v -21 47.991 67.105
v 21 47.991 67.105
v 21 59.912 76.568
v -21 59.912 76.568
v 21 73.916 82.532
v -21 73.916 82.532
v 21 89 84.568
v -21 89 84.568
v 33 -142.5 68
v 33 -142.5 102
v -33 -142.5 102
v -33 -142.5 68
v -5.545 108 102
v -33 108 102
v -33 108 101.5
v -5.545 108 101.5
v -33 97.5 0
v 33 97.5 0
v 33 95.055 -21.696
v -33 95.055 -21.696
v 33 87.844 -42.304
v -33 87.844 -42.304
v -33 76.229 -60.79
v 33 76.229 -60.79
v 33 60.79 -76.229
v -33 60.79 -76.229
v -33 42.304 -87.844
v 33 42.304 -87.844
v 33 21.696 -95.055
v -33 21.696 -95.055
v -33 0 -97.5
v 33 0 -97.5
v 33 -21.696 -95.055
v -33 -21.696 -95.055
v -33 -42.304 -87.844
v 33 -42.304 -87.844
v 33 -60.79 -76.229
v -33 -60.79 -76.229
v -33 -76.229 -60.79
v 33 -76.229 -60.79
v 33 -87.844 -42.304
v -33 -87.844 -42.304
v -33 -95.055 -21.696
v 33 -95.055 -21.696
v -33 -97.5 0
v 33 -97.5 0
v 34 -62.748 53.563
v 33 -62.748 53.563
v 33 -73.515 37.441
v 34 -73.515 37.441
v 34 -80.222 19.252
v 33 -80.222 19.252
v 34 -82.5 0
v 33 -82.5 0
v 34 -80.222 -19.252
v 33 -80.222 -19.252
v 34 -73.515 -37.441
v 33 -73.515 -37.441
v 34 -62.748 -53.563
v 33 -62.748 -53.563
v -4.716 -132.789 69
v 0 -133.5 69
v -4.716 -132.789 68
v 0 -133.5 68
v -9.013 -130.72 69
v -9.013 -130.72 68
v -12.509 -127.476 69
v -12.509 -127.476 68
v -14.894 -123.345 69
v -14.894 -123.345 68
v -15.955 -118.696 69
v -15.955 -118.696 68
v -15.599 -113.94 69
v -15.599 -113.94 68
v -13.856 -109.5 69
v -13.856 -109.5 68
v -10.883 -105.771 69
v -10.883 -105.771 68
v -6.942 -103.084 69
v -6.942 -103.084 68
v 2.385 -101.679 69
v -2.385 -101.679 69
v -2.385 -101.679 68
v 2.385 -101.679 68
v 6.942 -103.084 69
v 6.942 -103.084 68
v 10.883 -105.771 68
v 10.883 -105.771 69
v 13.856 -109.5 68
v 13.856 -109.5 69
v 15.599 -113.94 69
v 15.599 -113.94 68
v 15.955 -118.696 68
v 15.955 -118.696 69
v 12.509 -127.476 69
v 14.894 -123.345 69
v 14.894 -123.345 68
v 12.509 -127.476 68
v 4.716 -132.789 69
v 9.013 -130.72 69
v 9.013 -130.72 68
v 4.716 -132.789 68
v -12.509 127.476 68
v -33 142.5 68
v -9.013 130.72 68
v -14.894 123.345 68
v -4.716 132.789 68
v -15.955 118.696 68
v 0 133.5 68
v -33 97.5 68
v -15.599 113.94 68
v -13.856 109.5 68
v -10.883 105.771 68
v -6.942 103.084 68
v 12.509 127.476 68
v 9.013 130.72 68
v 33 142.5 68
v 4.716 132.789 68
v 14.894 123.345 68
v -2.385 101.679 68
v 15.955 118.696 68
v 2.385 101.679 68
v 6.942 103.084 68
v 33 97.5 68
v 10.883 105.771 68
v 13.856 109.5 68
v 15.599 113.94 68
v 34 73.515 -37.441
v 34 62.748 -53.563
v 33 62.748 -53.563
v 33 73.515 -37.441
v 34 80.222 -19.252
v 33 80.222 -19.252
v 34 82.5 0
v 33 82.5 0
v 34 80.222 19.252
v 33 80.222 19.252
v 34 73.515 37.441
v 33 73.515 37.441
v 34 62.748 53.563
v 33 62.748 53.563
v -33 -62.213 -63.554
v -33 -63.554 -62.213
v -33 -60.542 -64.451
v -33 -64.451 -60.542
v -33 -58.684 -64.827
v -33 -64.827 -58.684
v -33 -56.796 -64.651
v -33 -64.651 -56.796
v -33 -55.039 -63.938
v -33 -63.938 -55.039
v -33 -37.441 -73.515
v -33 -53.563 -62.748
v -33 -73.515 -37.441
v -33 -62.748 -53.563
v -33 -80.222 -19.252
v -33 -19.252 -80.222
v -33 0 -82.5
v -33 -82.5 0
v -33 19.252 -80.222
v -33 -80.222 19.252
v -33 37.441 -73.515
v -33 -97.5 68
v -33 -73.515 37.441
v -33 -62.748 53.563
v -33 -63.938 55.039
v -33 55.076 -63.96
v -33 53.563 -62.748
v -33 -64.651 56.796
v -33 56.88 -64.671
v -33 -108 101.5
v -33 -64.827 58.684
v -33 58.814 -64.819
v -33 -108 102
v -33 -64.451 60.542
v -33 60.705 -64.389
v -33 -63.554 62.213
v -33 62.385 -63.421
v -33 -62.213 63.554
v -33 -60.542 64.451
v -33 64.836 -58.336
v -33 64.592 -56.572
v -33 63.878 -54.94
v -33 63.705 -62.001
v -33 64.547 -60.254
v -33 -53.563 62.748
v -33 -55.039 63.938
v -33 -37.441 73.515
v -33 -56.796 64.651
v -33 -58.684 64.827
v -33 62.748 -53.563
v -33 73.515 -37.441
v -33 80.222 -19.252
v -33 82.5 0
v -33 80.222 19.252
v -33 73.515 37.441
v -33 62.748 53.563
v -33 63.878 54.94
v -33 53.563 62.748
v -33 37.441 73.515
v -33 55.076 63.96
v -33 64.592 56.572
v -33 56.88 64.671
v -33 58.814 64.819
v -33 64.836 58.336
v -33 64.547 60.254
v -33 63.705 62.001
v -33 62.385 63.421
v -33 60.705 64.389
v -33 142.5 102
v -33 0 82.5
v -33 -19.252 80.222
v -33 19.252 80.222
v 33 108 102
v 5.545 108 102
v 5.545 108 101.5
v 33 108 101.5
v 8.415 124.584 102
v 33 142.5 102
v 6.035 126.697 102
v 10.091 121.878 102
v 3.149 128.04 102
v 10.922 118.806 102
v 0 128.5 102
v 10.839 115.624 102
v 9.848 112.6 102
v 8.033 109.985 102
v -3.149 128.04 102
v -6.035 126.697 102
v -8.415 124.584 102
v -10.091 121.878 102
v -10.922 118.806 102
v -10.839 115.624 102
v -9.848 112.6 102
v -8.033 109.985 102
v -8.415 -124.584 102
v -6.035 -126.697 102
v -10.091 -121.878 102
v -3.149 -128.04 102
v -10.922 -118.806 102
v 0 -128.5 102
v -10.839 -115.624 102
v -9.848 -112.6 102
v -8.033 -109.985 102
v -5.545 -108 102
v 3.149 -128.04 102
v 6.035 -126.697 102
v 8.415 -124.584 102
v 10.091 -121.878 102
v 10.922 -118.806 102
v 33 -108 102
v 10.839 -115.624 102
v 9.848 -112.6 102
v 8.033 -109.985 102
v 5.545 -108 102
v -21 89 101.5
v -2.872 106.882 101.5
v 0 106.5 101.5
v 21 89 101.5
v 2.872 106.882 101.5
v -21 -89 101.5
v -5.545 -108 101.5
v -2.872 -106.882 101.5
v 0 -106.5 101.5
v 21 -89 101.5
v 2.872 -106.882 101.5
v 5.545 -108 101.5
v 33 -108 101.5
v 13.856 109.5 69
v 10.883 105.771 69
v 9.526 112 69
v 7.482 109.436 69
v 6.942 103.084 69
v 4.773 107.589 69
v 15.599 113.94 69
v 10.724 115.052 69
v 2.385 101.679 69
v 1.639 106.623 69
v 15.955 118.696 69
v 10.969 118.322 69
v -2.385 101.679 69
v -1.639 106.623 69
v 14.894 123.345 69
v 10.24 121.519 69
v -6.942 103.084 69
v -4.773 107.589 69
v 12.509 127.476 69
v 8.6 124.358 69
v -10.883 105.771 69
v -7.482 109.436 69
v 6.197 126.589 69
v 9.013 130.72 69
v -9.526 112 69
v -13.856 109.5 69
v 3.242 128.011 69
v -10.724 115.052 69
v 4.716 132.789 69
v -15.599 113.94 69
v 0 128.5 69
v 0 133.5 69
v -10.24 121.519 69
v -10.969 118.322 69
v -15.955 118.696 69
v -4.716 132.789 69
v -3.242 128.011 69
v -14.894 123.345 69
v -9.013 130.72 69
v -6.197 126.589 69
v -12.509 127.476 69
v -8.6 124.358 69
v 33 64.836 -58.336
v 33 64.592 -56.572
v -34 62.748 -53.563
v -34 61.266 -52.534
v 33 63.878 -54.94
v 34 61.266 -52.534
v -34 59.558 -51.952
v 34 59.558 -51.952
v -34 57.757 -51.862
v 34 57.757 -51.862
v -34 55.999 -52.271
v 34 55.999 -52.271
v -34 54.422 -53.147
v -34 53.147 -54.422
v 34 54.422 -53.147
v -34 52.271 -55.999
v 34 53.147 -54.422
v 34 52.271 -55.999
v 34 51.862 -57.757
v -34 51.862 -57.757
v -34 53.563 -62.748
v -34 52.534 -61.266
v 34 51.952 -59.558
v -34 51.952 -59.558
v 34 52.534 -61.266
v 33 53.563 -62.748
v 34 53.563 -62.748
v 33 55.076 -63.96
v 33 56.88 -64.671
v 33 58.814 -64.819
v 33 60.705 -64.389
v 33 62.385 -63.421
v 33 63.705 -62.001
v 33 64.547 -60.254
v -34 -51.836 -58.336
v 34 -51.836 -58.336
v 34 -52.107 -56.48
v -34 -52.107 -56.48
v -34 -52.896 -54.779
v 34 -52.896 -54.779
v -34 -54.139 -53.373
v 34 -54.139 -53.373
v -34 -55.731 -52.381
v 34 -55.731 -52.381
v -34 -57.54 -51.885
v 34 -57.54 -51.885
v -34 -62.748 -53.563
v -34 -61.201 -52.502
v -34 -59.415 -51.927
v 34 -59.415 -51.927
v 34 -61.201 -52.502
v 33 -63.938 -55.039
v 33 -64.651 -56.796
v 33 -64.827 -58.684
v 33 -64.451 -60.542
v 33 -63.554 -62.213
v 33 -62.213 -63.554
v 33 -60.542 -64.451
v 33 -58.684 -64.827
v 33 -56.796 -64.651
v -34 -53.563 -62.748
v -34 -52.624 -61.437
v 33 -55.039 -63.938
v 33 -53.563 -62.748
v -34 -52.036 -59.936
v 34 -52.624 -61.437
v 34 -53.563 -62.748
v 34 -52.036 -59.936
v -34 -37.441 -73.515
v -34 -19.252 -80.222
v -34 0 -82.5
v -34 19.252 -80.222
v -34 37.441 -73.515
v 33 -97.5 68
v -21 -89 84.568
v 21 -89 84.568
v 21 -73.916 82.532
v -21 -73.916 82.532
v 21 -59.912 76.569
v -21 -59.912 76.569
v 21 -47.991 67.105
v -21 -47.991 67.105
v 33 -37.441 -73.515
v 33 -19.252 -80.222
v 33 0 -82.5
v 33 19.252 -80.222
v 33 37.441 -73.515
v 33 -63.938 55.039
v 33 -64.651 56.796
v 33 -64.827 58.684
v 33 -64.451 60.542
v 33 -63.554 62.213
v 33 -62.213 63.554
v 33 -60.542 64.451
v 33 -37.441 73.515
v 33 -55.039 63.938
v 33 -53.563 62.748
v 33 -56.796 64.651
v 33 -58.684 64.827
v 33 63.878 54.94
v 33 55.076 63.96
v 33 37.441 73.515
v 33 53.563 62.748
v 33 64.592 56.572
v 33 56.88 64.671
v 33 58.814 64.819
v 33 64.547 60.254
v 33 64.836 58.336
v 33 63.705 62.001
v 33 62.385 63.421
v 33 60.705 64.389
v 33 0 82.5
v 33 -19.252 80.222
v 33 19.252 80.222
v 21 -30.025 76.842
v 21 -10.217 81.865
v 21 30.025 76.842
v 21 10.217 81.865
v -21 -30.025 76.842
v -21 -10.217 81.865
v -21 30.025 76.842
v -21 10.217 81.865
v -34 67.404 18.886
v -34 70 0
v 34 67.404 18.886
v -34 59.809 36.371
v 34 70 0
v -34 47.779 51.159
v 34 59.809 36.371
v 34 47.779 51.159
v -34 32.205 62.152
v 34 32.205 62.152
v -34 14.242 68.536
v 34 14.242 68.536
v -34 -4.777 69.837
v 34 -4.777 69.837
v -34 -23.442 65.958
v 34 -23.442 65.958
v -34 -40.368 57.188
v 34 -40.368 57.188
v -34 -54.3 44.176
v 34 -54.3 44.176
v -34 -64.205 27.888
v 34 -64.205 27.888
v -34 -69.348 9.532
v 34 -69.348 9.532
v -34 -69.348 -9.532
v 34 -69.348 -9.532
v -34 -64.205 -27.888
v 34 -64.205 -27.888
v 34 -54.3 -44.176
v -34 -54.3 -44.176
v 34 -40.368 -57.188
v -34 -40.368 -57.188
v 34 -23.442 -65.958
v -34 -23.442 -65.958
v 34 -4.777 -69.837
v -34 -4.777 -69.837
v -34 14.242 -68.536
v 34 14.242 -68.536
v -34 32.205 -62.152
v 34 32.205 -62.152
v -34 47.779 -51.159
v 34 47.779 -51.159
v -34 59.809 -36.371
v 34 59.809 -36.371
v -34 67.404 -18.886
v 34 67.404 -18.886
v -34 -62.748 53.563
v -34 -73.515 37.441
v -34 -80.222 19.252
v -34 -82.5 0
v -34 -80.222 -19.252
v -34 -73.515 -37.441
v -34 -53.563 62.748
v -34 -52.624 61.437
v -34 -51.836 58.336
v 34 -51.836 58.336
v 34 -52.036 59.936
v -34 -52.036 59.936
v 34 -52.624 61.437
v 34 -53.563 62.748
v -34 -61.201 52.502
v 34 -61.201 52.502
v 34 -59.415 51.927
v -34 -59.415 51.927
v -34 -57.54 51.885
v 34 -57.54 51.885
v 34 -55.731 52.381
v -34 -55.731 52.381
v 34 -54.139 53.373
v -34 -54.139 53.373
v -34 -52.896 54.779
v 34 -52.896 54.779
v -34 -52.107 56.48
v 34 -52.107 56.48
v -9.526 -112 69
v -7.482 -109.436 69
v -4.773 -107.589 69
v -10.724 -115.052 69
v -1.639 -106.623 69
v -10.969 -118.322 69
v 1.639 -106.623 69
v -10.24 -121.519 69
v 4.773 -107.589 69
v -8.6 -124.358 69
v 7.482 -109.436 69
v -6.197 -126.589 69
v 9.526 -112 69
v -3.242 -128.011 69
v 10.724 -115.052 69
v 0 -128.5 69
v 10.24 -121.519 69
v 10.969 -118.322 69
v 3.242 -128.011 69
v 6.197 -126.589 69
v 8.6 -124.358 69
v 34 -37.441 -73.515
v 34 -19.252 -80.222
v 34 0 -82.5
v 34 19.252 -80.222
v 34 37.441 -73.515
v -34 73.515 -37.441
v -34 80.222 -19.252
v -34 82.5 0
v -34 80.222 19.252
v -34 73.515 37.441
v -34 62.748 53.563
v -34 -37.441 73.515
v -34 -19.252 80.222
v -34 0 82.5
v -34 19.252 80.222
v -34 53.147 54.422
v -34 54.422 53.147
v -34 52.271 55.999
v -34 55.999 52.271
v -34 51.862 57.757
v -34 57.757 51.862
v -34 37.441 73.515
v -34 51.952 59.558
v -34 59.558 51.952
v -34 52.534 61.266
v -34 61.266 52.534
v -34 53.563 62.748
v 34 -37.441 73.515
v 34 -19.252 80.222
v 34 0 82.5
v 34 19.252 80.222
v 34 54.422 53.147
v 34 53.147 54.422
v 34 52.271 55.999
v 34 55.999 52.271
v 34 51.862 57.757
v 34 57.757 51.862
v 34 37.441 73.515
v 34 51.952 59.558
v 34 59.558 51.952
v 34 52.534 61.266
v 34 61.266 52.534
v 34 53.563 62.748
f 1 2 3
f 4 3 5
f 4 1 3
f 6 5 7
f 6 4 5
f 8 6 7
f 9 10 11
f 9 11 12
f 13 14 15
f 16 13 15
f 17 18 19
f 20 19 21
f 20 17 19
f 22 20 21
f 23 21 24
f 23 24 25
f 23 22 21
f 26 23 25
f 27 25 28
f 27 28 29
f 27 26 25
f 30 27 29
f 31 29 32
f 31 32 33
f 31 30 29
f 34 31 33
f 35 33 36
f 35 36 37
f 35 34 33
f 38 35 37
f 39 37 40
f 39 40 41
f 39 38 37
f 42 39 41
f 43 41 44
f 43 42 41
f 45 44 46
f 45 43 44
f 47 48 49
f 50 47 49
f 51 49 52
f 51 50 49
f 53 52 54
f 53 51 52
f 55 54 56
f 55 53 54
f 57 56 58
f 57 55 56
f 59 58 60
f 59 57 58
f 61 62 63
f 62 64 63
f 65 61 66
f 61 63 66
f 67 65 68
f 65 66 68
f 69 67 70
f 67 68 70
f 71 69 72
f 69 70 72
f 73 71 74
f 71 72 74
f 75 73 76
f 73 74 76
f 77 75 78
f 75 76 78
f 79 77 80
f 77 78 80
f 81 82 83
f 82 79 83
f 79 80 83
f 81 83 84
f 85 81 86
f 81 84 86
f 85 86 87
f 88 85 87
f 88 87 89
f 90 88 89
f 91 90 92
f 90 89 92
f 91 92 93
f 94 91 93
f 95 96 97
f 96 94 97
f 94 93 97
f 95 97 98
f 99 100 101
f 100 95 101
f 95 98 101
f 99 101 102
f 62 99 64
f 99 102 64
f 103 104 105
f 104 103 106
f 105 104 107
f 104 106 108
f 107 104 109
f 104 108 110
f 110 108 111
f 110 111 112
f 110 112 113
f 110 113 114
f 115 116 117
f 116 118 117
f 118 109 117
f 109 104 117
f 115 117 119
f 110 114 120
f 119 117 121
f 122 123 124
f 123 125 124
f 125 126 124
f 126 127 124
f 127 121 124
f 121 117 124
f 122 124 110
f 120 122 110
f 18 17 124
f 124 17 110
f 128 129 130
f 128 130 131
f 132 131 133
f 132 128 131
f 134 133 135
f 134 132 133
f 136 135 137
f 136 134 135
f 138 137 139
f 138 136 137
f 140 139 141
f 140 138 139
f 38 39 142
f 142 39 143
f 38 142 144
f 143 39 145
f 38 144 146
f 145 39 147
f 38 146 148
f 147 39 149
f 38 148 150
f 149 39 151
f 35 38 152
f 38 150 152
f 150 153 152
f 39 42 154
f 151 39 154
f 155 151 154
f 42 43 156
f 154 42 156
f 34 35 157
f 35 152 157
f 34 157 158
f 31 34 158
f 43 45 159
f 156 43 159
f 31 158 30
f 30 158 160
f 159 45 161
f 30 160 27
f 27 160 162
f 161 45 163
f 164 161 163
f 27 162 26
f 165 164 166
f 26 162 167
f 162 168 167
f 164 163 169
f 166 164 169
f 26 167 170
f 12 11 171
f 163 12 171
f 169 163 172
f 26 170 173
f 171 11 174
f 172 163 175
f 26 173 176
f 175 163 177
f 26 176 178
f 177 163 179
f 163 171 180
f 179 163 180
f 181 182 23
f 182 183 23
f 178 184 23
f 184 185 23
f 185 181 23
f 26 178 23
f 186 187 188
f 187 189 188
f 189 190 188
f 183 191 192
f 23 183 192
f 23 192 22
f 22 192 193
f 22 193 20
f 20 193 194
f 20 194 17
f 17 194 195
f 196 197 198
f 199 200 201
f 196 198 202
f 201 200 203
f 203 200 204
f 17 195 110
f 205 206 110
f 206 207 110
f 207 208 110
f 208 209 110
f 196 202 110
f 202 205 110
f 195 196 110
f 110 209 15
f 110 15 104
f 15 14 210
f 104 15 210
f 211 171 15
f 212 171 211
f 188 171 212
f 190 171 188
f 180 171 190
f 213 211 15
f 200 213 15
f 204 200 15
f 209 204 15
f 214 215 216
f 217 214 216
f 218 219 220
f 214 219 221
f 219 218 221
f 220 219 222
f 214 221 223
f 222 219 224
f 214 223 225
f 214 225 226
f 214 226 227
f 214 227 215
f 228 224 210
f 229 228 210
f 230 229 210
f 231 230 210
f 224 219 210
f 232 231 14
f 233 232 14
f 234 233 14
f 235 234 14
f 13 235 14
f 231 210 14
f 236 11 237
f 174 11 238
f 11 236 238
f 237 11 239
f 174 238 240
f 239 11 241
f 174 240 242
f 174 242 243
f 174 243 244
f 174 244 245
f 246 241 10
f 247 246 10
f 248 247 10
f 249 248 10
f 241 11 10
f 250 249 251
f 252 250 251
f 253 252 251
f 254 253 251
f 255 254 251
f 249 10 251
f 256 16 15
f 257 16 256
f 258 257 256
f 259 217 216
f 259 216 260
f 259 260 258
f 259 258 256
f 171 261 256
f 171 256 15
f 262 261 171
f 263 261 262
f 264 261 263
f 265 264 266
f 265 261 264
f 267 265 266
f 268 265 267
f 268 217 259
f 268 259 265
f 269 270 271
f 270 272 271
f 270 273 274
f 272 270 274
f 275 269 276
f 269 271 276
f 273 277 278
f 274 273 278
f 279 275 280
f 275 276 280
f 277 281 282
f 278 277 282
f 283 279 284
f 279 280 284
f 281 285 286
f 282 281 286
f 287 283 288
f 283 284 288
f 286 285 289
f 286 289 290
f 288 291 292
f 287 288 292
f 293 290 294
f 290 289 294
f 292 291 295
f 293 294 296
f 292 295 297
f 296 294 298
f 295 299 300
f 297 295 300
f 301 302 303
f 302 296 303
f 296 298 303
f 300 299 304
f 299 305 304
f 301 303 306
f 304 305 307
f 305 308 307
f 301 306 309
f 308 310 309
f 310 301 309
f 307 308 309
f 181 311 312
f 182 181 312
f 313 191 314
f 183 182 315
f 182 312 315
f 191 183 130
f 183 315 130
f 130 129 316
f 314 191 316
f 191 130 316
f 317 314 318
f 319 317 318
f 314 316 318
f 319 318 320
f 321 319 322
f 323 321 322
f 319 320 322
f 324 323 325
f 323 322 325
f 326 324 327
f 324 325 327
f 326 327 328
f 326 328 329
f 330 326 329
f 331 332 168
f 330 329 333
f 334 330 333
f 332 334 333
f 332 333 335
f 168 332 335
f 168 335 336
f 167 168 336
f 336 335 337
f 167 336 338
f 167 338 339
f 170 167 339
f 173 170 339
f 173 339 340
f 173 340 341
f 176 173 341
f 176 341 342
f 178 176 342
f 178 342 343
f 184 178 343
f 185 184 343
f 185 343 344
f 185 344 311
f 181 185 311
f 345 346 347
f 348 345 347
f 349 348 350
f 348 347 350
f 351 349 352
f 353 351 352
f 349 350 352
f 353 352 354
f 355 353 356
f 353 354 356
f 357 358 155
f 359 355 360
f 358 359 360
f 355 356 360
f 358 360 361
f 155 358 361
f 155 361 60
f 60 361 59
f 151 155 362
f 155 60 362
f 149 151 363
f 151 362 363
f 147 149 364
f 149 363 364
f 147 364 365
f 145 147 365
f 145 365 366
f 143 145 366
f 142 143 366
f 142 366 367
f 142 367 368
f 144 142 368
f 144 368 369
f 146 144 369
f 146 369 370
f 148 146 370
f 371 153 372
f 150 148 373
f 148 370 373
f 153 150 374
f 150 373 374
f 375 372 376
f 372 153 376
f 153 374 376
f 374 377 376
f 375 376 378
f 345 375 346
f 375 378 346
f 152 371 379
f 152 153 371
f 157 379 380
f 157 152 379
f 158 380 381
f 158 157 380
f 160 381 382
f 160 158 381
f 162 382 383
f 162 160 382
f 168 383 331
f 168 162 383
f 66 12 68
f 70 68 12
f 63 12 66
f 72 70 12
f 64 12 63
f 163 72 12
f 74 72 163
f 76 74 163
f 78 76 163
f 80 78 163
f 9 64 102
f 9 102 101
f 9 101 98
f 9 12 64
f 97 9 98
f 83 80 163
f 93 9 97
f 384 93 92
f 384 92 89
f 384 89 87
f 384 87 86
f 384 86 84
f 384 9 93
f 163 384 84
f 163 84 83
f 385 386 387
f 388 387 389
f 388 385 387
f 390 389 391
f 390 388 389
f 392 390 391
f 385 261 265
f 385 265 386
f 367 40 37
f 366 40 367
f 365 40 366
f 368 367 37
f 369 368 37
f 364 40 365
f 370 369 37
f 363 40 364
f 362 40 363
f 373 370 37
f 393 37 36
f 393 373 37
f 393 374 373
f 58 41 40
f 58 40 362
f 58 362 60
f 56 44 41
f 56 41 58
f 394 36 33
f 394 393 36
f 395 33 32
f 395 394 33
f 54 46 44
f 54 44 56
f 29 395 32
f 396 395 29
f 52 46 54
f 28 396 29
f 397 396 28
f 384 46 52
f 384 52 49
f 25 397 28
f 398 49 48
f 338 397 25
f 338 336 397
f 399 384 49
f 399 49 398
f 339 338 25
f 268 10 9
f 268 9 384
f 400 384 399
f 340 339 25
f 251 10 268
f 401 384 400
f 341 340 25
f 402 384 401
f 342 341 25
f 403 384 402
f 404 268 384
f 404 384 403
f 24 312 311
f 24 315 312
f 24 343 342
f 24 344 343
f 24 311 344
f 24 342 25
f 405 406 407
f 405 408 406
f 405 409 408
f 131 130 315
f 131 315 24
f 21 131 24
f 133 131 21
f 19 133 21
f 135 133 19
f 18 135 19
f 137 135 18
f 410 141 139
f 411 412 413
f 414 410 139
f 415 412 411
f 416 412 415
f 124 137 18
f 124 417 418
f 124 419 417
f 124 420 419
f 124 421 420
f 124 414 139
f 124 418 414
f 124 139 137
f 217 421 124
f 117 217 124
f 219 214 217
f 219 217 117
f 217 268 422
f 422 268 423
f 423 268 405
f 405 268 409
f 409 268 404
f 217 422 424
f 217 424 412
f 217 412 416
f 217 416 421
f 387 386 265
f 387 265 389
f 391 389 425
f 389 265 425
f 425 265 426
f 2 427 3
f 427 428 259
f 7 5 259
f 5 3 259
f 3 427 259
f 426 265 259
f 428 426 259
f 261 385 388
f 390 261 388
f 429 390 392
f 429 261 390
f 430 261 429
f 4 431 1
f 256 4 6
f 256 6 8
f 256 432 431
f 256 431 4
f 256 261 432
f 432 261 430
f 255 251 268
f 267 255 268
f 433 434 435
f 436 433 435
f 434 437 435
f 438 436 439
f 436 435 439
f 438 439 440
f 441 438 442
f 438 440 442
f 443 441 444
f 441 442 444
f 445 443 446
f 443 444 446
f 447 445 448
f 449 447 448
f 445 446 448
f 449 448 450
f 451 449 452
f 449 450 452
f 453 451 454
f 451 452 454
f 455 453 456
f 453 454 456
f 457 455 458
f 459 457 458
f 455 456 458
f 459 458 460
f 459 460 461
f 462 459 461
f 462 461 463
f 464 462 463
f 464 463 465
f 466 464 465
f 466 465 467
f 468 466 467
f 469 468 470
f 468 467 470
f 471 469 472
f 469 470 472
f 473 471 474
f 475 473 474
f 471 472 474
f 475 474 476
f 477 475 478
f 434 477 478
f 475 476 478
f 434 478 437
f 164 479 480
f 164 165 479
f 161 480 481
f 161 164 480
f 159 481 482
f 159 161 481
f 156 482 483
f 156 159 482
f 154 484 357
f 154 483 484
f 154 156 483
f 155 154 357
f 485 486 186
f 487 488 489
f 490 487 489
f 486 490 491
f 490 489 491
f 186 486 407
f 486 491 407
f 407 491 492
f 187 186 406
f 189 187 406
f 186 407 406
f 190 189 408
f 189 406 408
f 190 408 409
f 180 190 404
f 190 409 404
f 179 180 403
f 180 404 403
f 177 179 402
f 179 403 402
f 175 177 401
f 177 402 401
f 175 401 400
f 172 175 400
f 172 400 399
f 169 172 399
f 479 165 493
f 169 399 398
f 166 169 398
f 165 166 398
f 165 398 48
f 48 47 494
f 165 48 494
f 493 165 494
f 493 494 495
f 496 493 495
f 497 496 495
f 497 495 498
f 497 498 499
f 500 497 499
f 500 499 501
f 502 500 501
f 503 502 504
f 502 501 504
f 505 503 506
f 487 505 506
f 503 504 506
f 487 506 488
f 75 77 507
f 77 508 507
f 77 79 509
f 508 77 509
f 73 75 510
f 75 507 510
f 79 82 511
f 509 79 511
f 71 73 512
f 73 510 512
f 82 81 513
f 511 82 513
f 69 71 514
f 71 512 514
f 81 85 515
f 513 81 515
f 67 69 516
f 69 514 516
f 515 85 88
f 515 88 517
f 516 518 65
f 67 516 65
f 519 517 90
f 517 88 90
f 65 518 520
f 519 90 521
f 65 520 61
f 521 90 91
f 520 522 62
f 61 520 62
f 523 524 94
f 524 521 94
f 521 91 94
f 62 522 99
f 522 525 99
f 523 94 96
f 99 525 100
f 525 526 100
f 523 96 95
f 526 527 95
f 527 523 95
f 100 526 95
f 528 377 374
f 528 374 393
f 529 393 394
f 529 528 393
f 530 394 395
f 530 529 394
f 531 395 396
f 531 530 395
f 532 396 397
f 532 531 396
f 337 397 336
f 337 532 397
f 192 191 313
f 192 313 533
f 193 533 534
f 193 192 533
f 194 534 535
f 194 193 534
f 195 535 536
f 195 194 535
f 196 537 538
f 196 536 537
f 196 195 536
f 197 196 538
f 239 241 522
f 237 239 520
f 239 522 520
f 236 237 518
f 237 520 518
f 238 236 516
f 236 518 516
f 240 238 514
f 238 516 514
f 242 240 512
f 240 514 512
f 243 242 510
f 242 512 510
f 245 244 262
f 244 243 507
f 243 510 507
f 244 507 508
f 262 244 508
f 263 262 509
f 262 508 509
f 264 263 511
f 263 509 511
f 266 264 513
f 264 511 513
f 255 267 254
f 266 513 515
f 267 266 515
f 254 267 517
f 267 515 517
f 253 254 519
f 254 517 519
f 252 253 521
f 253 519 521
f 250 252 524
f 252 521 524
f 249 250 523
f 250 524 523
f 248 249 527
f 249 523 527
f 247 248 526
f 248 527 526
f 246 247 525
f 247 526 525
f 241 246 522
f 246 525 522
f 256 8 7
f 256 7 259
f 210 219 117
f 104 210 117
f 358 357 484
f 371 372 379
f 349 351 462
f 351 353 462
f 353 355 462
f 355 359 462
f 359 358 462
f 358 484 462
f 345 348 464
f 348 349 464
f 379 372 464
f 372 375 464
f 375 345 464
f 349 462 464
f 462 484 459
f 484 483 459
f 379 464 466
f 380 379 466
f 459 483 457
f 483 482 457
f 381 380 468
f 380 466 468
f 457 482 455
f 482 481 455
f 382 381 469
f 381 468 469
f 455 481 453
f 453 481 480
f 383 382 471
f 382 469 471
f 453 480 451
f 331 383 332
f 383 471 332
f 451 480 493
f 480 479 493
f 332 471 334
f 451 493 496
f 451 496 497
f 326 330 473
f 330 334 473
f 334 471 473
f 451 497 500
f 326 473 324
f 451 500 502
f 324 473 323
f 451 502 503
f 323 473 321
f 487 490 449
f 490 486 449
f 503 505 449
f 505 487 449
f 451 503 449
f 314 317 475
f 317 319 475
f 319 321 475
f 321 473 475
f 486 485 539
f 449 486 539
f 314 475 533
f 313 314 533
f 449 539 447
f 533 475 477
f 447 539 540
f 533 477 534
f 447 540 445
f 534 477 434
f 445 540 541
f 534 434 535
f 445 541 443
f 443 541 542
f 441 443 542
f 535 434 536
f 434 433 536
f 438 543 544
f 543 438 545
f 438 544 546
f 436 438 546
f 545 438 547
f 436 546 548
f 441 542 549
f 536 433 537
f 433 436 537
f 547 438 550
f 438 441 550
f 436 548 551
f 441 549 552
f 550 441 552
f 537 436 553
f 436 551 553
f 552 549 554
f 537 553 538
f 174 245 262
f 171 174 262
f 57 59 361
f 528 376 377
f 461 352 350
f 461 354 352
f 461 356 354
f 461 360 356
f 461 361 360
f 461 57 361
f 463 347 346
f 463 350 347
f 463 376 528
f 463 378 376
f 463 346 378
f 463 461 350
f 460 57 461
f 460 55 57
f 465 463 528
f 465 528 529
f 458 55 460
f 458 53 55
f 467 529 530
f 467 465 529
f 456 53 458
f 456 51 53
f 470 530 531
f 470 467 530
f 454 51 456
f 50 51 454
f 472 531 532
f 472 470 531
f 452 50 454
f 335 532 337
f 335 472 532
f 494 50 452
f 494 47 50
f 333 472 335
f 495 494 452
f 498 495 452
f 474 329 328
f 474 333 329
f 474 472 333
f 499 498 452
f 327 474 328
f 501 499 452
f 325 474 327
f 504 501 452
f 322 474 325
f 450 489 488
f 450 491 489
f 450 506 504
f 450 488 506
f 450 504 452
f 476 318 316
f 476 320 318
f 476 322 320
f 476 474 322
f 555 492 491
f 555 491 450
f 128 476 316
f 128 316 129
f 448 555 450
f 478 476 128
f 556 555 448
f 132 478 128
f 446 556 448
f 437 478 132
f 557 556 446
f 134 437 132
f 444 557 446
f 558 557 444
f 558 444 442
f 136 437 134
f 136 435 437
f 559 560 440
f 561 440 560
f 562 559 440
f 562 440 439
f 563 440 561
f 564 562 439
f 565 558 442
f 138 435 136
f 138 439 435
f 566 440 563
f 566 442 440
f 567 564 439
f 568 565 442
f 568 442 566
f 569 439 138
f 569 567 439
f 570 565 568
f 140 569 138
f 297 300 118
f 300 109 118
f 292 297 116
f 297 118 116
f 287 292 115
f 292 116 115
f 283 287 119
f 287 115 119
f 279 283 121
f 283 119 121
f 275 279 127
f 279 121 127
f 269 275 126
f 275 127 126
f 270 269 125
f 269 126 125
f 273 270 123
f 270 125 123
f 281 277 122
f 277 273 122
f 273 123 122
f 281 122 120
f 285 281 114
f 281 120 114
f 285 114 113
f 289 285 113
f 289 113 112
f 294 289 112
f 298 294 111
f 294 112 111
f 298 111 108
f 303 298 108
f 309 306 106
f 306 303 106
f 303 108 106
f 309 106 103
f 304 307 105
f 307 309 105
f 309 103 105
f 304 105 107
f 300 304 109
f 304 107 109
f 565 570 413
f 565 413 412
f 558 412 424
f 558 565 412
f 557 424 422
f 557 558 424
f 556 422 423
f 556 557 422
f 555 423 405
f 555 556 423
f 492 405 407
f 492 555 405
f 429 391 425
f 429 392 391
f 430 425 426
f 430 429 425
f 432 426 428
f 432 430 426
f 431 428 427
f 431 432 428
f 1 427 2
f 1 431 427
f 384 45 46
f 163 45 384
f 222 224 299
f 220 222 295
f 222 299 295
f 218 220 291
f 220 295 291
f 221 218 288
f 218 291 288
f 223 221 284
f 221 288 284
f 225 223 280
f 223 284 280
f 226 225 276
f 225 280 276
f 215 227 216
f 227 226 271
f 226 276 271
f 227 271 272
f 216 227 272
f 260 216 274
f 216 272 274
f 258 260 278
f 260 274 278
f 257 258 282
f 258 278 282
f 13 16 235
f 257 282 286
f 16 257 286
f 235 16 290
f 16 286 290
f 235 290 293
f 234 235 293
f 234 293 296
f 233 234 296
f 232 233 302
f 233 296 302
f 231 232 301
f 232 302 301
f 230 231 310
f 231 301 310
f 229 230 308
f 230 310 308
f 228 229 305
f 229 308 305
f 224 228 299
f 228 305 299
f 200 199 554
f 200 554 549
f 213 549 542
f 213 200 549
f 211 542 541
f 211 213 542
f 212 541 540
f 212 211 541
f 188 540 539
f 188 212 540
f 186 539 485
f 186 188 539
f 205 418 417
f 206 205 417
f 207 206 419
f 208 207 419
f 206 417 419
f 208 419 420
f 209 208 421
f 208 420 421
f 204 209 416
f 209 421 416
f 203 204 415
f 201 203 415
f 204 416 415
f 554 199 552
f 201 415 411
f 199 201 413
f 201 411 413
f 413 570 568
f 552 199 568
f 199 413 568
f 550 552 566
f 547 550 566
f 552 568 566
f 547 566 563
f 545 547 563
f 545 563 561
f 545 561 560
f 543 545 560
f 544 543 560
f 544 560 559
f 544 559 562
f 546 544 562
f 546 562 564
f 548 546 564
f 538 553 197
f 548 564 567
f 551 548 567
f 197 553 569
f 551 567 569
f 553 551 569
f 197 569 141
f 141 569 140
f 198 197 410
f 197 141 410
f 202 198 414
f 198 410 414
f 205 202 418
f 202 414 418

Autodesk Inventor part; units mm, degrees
ref_plane "XZ Plane" through (0, 0, 0) normal (0, 1, 0) x (-1, 0, 0)
ref_plane "XY Plane" through (0, 0, 0) normal (0, 0, 1) x (1, 0, 0)
sketch "Эскиз1" plane through (0, 0, 0) normal (1, 0, 0) x (0, 1, 0)
  circle A0 centre (0, 0) radius 70
  circle A1 centre (0, 0) radius 82.5
  arc A2 (80.4212, 18.894) -> (80.3103, 18.8815) centre (82.3009, 1.7165) ccw
  circle A3 centre (0, 0) radius 97.5
  line L0 (142.5, 102) -> (108, 102)
  line L1 (0, -132.6) -> (0, 165.6) projected
  line L2 (142.5, 102) -> (142.5, 68)
  line L3 (108, 102) -> (108, 101.5)
  line L4 (108, 101.5) -> (0, 101.5)
  line L5 (-142.5, 102) -> (-108, 102)
  line L6 (-142.5, 102) -> (-142.5, 68)
  line L7 (-108, 102) -> (-108, 101.5)
  line L8 (-108, 101.5) -> (0, 101.5)
  arc A4 (11.7449, -38.2368) -> (27.2385, -29.2927) centre (0, 0) ccw
  arc A5 (-27.2416, -29.2898) -> (-11.749, -38.2356) centre (0, 0) ccw
  line L9 (-142.5, 68) -> (-69.8731, 68)
  line L10 (97.5, 0) -> (97.5, 68)
  line L11 (142.5, 68) -> (69.8731, 68)
  line L12 (-97.5, 0) -> (-97.5, 68)
  line L13 (117.5, 43) -> (117.5, 123)
  line L14 (-117.5, 43) -> (-117.5, 123)
  line L15 (133.5, 68) -> (117.5, 68)
  line L16 (117.5, 68) -> (117.5, 69)
  line L17 (117.5, 69) -> (133.5, 69)
  line L18 (133.5, 69) -> (133.5, 68)
  line L19 (128.5, 69) -> (117.5, 69)
  line L20 (117.5, 69) -> (117.5, 85)
  line L21 (128.5, 102) -> (128.5, 69)
  line L22 (133.5, 102) -> (117.5, 102)
  line L23 (117.5, 69) -> (101.5, 69)
  line L24 (101.5, 69) -> (101.5, 68)
  line L25 (106.5, 101.5) -> (106.5, 69)
  line L26 (-108, 102) -> (-108, 101.5)
  line L27 (-133.5, 68) -> (-117.5, 68)
  line L28 (-117.5, 68) -> (-117.5, 69)
  line L29 (-117.5, 69) -> (-133.5, 69)
  line L30 (-133.5, 69) -> (-133.5, 68)
  line L31 (-128.5, 69) -> (-117.5, 69)
  line L32 (-117.5, 69) -> (-117.5, 85)
  line L33 (-128.5, 102) -> (-128.5, 69)
  line L34 (-133.5, 102) -> (-117.5, 102)
  line L35 (-101.5, 69) -> (-101.5, 68)
  line L36 (-117.5, 69) -> (-101.5, 69)
  line L37 (-106.5, 101.5) -> (-106.5, 69)
  line L38 (117.5, 68) -> (117.5, 102)
  line L39 (-117.5, 68) -> (-117.5, 102)
  line L40 (0, 0) -> (69.6414, -69.6414)
  circle A6 centre (58.3363, -58.3363) radius 6.5
  circle A7 centre (58.3363, 58.3363) radius 6.5
  circle A8 centre (-58.3363, 58.3363) radius 6.5
  circle A9 centre (-58.3363, -58.3363) radius 6.5
  arc A10 (69.8731, 68) -> (-69.8731, 68) centre (0, 0) ccw
  line L41 (97.5, 68) -> (69.8731, 68)
  line L42 (-69.8731, 68) -> (-97.5, 68)
  line L43 (128.5, 69) -> (128.5, 102)
  line L44 (89, 68) -> (89, 101.5)
  arc A11 (83.0142, 68) -> (79.5188, 56.4182) centre (116.097, 51.6972) ccw
  arc A12 (79.5188, 56.4182) -> (62.6803, 74.6822) centre (0, 0) ccw
  line L45 (83.0142, 68) -> (83.0142, 84.568)
  line L46 (83.0142, 84.568) -> (89, 84.568)
  arc A13 (79.5188, 56.4182) -> (62.6803, 74.6822) centre (0, 0) ccw
  line L47 (-101.5, 69) -> (-101.5, 68)
  line L48 (-97.5, 68) -> (-69.8731, 68)
  arc A14 (-79.5188, 56.4182) -> (-83.0142, 68) centre (-116.097, 51.6972) ccw
  arc A15 (-62.6803, 74.6822) -> (-79.5188, 56.4182) centre (0, 0) ccw
  line L49 (-83.0142, 68) -> (-83.0142, 84.568)
  line L50 (-83.0142, 84.568) -> (-89, 84.568)
  arc A16 (-62.6803, 74.6822) -> (-79.5188, 56.4182) centre (0, 0) ccw
  line L51 (0, 97.5) -> (0, 101.5)
  line L52 (0, 101.5) -> (89, 101.5)
  line L53 (89, 101.5) -> (89, 84.568)
  arc A17 (62.6803, 74.6822) -> (0, 97.5) centre (0, 0) ccw
  arc A18 (89, 84.568) -> (47.9908, 67.1054) centre (89, 27.6838) ccw
  arc A19 (47.9908, 67.1054) -> (0, 82.5) centre (0, 0) ccw
  line L54 (79.5188, 56.4182) -> (60.3628, 70.1005)
  line L55 (60.3628, 70.1005) -> (47.9908, 67.1054)
  arc A20 (-47.9908, 67.1054) -> (-89, 84.568) centre (-89, 27.6838) ccw
  line L56 (-79.5188, 56.4182) -> (-59.1498, 66.8423)
  line L57 (-59.1498, 66.8423) -> (-47.9908, 67.1054)
  line L58 (0, 101.5) -> (-89, 101.5)
  line L59 (-89, 101.5) -> (-89, 84.568)
  arc A21 (-47.9908, 67.1054) -> (-89, 84.568) centre (-89, 27.6838) ccw
  arc A22 (0, 82.5) -> (-47.9908, 67.1054) centre (0, 0) ccw
  arc A23 (47.9908, 67.1054) -> (-47.9908, 67.1054) centre (0, 0) ccw
  point P0 (80.4117, 18.4447)
  point P1 (0, -97.5)
  point P2 (128.5, 85)
  point P3 (106.5, 85)
  point P4 (-128.5, 85)
  point P5 (-106.5, 85)
  point P6 (-89, 68)
  dimension "d0" = 140
  dimension "d4" = 165
  dimension "d19" = 195
  dimension "d20" = 199.5
  dimension "d22" = 285
  dimension "d23" = 216
  dimension "d24" = 0.5
  dimension "d46" = 34
  dimension "d64" = 235
  dimension "d65" = 16
  dimension "d66" = 11
  dimension "d67" = 1
  dimension "d70" = 45
  dimension "d71" = 13
  dimension "d74" = 360
  dimension "d84" = 12.5
extrude "Выдавливание1" add sketch "Эскиз1" along normal blind 34 and the other way blind 34 contours A0 L1 A1 A7 A6 L40 | A0 L1 A1 A9 A8 | L40 A6 A1 L1 A0 | A6 A1 L40 | L40 A1 A6 | A1 A9 | A1 A7 | A8 A1 picked at (57.6773, -55.9908) picked at (55.9908, -57.6773) picked at (-56.6588, -56.9353) picked at (56.9815, 56.6214) picked at (-56.6588, 56.9353)
extrude "Выдавливание2" add sketch "Эскиз1" along normal blind 34 and the other way blind 34 contours A0 L40 L1 | A0 L1 A1 A7 A6 L40 | L1 A0 | A0 L1 A1 A9 A8 | L40 A6 A1 L1 A0 | A0 L1 L40 | A6 A1 L40 | L40 A1 A6 | A1 A9 | A1 A7 | A8 A1 picked at (57.6773, -55.9908) picked at (55.9908, -57.6773) picked at (-56.6588, -56.9353) picked at (56.9815, 56.6214) picked at (-56.6588, 56.9353)
pattern_circular "Круговой массив1" count 6 over 360 about axis through (0, 0, 0) along (1, 0, 0) of "Выдавливание2"
extrude "Выдавливание3" add sketch "Эскиз1" along normal blind 33 and the other way blind 33 contours A0 L40 L1 | A0 L1 A1 A7 A6 L40 | L1 A0 | A0 L1 A1 A9 A8 | L40 A6 A1 L1 A0 | A0 L1 L40 | L1 A3 A18 A1 | A1 A20 A3 L1 | A6 A1 L40 | L40 A1 A6 | L1 A3 L56 L57 A1 A8 A9 | A1 A6 L40 A3 L1 | L55 L54 A3 L40 A6 A1 A7 | A18 A3 L54 L55 | L57 L56 A3 A20 | L40 A6 A1 | A1 A6 L40 | A9 A1 | A1 A9 | A7 A1 | A1 A7 | A8 A1 | A1 A8 | A11 L11 L10 A3 | A3 L11 A11
extrude "Выдавливание4" add sketch "Эскиз1" along normal blind 33 and the other way blind 33 contours L12 L9 A14 A3 | A14 L9 A3
extrude "Выдавливание7" add sketch "Эскиз1" along normal blind 33 and the other way blind 33 contours A0 L40 L1 | A0 L1 A1 A7 A6 L40 | L1 A0 | A0 L1 A1 A9 A8 | L40 A6 A1 L1 A0 | A0 L1 L40 | L1 A3 A18 A1 | A1 A20 A3 L1 | L1 A3 L56 L57 A1 A8 A9 | A1 A6 L40 A3 L1 | L55 L54 A3 L40 A6 A1 A7 | A18 A3 L54 L55 | L57 L56 A3 A20 | L1 L4 L44 L46 L45 A18 A3 | A3 A20 L49 L50 L59 L8 L1 | A18 L45 L11 A3 | A3 L9 L49 A20 | A18 L44 L11 L45 | L45 L46 A18 | A20 L50 L49 | L49 L9 L35 L36 L37 L8 L59 A20 | L4 L25 L23 L24 L11 L44 | L37 L36 L14 L5 L7 L8 | L9 L14 L36 L35 | L23 L13 L11 L24 | L9 L30 L29 L14 | L17 L18 L11 L13 | L29 L33 L5 L14 | L9 L6 L5 L33 L29 L30 | L21 L0 L2 L11 L18 L17
extrude "Выдавливание8" add sketch "Эскиз1" along normal blind 33 and the other way blind 33 contours L4 L3 L0 L13 L23 L25 | L17 L18 L11 L13 | L13 L0 L21 L17 | L21 L0 L2 L11 L18 L17
revolve "Вращение2" cut sketch "Эскиз1" angle 360 about axis through (0, -117.5, 43) along (0, 0, 1) contours L9 L30 L29 L14 | L29 L33 L5 L14
extrude "Выдавливание9" add sketch "Эскиз1" along normal blind 33 and the other way blind 33 contours A18 L44 L11 L45 | L45 L46 A18 | L4 L25 L23 L24 L11 L44 | L23 L13 L11 L24 | L17 L18 L11 L13
extrude "Выдавливание11" [suppressed]
revolve "Вращение1" cut sketch "Эскиз1" angle 360 about axis through (0, 117.5, 43) along (0, 0, 1) contours L17 L18 L11 L13 | L13 L0 L21 L17
extrude "Выдавливание12" cut sketch "Эскиз1" along normal blind 21 and the other way blind 21 contours L1 A3 A18 A1 | A1 A20 A3 L1 | L1 L4 L44 L46 L45 A18 A3 | A3 A20 L49 L50 L59 L8 L1 | L45 L46 A18 | A20 L50 L49
extrude "Выдавливание13" cut sketch "Эскиз1" along normal through all both and the other way through all contours A6 A1 L40 | L40 A1 A6 | L40 A6 A1 | A1 A6 L40 | A9 A1 | A1 A9 | A7 A1 | A1 A7 | A8 A1 | A1 A8
extrude "Выдавливание14" cut sketch "Эскиз1" along normal through all both and the other way through all contours A0 L40 L1 | L1 A0 | A0 L1 L40
sketch "Эскиз3" plane through (34, 0, 0) normal (1, 0, 0) x (0, 0, -1)
  line L0 (-68, 97.5) -> (-68, 142.5) projected
  line L1 (-68, 97.5) -> (-68, 86.5)
  line L2 (-68, 86.5) -> (-85, 67.5)
  line L3 (-85, 67.5) -> (-101.5, 67.5)
  line L4 (-101.5, 89) -> (-101.5, -89) projected
  line L5 (-101.5, 67.5) -> (-101.5, 0)
  arc A0 (0, 97.5) -> (0, 97.5) centre (0, 0) ccw projected
  line L6 (-68, 97.5) -> (-52.0783, 73.402)
  line L7 (137.4, 0) -> (-141.9, 0) projected
  line L8 (-68, -97.5) -> (-64, -83.0142)
  line L9 (-68, -97.5) -> (-68, -86.5)
  line L10 (-68, -86.5) -> (-85, -67.5)
  line L11 (-85, -67.5) -> (-101.5, -67.5)
  line L12 (-101.5, -67.5) -> (-101.5, 0)
  line L13 (-68, -97.5) -> (-52.0783, -73.402)
  arc A1 (-64, 83.0142) -> (-52.0783, 73.402) centre (-35.394, 106.294) ccw projected
  arc A2 (-52.0783, -73.402) -> (-64, -83.0142) centre (-35.394, -106.294) ccw projected
  arc A3 (-52.0783, 73.402) -> (-52.0783, -73.402) centre (0, 0) ccw
  point P0 (-68, 142.5)
extrude "Выдавливание15" [suppressed]
extrude "Выдавливание16" [suppressed]
sketch "Эскиз4" plane through (-34, 0, 0) normal (-1, 0, 0) x (0, -1, 0)
  circle A0 centre (-58.3363, -58.3363) radius 6.5 projected
  arc A1 (-66.7759, -48.4482) -> (-58.3363, -58.3363) centre (0, 0) ccw
  arc A2 (-66.7759, -48.4482) -> (-48.4482, -66.7759) centre (-58.3363, -58.3363) ccw
  arc A3 (-58.3363, -58.3363) -> (-48.4482, -66.7759) centre (0, 0) ccw
  arc A4 (-62.7479, -53.5626) -> (-53.5626, -62.7479) centre (-58.3363, -58.3363) ccw
  arc A5 (-53.5626, -62.7479) -> (-48.4482, -66.7759) centre (0, 0) ccw
  arc A6 (-66.7759, -48.4482) -> (-62.7479, -53.5626) centre (0, 0) ccw
  arc A7 (48.4482, -66.7759) -> (58.3363, -58.3363) centre (0, 0) ccw
  arc A8 (48.4482, -66.7759) -> (66.7759, -48.4482) centre (58.3363, -58.3363) ccw
  arc A9 (58.3363, -58.3363) -> (66.7759, -48.4482) centre (0, 0) ccw
  arc A10 (53.5626, -62.7479) -> (62.7479, -53.5626) centre (58.3363, -58.3363) ccw
  arc A11 (62.7479, -53.5626) -> (66.7759, -48.4482) centre (0, 0) ccw
  arc A12 (48.4482, -66.7759) -> (53.5626, -62.7479) centre (0, 0) ccw
  arc A13 (66.7759, 48.4482) -> (58.3363, 58.3363) centre (0, 0) ccw
  arc A14 (66.7759, 48.4482) -> (48.4482, 66.7759) centre (58.3363, 58.3363) ccw
  arc A15 (58.3363, 58.3363) -> (48.4482, 66.7759) centre (0, 0) ccw
  arc A16 (62.7479, 53.5626) -> (53.5626, 62.7479) centre (58.3363, 58.3363) ccw
  arc A17 (53.5626, 62.7479) -> (48.4482, 66.7759) centre (0, 0) ccw
  arc A18 (66.7759, 48.4482) -> (62.7479, 53.5626) centre (0, 0) ccw
  arc A19 (-48.4482, 66.7759) -> (-58.3363, 58.3363) centre (0, 0) ccw
  arc A20 (-48.4482, 66.7759) -> (-66.7759, 48.4482) centre (-58.3363, 58.3363) ccw
  arc A21 (-58.3363, 58.3363) -> (-66.7759, 48.4482) centre (0, 0) ccw
  arc A22 (-53.5626, 62.7479) -> (-62.7479, 53.5626) centre (-58.3363, 58.3363) ccw
  arc A23 (-62.7479, 53.5626) -> (-66.7759, 48.4482) centre (0, 0) ccw
  arc A24 (-48.4482, 66.7759) -> (-53.5626, 62.7479) centre (0, 0) ccw
  arc A25 (-66.7759, -48.4482) -> (-48.4482, -66.7759) centre (0, 0) ccw
  arc A26 (-66.7759, -48.4482) -> (-48.4482, -66.7759) centre (0, 0) ccw
  arc A27 (-66.7759, -48.4482) -> (-48.4482, -66.7759) centre (0, 0) ccw
  arc A28 (-66.7759, -48.4482) -> (-48.4482, -66.7759) centre (-58.3363, -58.3363) ccw
  dimension "d112" = 360
  dimension "d116" = 360
  dimension "d118" = 13
equation "\"d0\" = D"
equation "\"d4\" = D1"
equation "\"d19\" = -2 * H1 + 2 * H_"
equation "\"d20\" = H_"
equation "\"d22\" = L"
equation "\"d23\" = t"
equation "\"d46\" = h_"
equation "\"d64\" = L2"
equation "\"d65\" = 0.5 * d3"
equation "\"d66\" = 0.5 * d1"
equation "\"d71\" = d"
equation "\"d25\" = 0.5 * B"
equation "\"d26\" = 0.5 * B"
equation "\"d34\" = 0.5 * B"
equation "\"d35\" = 0.5 * B"
equation "\"d76\" = 0.5 * B1"
equation "\"d77\" = 0.5 * B1"
equation "\"d80\" = 0.5 * B1"
equation "\"d81\" = 0.5 * B1"
equation "\"d85\" = 0.5 * B1"
equation "\"d86\" = 0.5 * B1"
equation "\"d94\" = 0.5 * B1"
equation "\"d95\" = 0.5 * B"
equation "\"D\" = 140"
equation "\"D1\" = 165"
equation "\"d\" = 13"
equation "\"del\" = 0.12"
equation "\"d1\" = 22"
equation "\"L2\" = 235"
equation "\"B\" = 68"
equation "\"B1\" = 66"
equation "\"L\" = 285"
equation "\"L1\" = 195"
equation "\"t\" = 216"
equation "\"H_\" = 199.5"
equation "\"H1\" = 102"
equation "\"h_\" = 34"
equation "\"d3\" = 32"
properties part number "корпус подшипника1"
